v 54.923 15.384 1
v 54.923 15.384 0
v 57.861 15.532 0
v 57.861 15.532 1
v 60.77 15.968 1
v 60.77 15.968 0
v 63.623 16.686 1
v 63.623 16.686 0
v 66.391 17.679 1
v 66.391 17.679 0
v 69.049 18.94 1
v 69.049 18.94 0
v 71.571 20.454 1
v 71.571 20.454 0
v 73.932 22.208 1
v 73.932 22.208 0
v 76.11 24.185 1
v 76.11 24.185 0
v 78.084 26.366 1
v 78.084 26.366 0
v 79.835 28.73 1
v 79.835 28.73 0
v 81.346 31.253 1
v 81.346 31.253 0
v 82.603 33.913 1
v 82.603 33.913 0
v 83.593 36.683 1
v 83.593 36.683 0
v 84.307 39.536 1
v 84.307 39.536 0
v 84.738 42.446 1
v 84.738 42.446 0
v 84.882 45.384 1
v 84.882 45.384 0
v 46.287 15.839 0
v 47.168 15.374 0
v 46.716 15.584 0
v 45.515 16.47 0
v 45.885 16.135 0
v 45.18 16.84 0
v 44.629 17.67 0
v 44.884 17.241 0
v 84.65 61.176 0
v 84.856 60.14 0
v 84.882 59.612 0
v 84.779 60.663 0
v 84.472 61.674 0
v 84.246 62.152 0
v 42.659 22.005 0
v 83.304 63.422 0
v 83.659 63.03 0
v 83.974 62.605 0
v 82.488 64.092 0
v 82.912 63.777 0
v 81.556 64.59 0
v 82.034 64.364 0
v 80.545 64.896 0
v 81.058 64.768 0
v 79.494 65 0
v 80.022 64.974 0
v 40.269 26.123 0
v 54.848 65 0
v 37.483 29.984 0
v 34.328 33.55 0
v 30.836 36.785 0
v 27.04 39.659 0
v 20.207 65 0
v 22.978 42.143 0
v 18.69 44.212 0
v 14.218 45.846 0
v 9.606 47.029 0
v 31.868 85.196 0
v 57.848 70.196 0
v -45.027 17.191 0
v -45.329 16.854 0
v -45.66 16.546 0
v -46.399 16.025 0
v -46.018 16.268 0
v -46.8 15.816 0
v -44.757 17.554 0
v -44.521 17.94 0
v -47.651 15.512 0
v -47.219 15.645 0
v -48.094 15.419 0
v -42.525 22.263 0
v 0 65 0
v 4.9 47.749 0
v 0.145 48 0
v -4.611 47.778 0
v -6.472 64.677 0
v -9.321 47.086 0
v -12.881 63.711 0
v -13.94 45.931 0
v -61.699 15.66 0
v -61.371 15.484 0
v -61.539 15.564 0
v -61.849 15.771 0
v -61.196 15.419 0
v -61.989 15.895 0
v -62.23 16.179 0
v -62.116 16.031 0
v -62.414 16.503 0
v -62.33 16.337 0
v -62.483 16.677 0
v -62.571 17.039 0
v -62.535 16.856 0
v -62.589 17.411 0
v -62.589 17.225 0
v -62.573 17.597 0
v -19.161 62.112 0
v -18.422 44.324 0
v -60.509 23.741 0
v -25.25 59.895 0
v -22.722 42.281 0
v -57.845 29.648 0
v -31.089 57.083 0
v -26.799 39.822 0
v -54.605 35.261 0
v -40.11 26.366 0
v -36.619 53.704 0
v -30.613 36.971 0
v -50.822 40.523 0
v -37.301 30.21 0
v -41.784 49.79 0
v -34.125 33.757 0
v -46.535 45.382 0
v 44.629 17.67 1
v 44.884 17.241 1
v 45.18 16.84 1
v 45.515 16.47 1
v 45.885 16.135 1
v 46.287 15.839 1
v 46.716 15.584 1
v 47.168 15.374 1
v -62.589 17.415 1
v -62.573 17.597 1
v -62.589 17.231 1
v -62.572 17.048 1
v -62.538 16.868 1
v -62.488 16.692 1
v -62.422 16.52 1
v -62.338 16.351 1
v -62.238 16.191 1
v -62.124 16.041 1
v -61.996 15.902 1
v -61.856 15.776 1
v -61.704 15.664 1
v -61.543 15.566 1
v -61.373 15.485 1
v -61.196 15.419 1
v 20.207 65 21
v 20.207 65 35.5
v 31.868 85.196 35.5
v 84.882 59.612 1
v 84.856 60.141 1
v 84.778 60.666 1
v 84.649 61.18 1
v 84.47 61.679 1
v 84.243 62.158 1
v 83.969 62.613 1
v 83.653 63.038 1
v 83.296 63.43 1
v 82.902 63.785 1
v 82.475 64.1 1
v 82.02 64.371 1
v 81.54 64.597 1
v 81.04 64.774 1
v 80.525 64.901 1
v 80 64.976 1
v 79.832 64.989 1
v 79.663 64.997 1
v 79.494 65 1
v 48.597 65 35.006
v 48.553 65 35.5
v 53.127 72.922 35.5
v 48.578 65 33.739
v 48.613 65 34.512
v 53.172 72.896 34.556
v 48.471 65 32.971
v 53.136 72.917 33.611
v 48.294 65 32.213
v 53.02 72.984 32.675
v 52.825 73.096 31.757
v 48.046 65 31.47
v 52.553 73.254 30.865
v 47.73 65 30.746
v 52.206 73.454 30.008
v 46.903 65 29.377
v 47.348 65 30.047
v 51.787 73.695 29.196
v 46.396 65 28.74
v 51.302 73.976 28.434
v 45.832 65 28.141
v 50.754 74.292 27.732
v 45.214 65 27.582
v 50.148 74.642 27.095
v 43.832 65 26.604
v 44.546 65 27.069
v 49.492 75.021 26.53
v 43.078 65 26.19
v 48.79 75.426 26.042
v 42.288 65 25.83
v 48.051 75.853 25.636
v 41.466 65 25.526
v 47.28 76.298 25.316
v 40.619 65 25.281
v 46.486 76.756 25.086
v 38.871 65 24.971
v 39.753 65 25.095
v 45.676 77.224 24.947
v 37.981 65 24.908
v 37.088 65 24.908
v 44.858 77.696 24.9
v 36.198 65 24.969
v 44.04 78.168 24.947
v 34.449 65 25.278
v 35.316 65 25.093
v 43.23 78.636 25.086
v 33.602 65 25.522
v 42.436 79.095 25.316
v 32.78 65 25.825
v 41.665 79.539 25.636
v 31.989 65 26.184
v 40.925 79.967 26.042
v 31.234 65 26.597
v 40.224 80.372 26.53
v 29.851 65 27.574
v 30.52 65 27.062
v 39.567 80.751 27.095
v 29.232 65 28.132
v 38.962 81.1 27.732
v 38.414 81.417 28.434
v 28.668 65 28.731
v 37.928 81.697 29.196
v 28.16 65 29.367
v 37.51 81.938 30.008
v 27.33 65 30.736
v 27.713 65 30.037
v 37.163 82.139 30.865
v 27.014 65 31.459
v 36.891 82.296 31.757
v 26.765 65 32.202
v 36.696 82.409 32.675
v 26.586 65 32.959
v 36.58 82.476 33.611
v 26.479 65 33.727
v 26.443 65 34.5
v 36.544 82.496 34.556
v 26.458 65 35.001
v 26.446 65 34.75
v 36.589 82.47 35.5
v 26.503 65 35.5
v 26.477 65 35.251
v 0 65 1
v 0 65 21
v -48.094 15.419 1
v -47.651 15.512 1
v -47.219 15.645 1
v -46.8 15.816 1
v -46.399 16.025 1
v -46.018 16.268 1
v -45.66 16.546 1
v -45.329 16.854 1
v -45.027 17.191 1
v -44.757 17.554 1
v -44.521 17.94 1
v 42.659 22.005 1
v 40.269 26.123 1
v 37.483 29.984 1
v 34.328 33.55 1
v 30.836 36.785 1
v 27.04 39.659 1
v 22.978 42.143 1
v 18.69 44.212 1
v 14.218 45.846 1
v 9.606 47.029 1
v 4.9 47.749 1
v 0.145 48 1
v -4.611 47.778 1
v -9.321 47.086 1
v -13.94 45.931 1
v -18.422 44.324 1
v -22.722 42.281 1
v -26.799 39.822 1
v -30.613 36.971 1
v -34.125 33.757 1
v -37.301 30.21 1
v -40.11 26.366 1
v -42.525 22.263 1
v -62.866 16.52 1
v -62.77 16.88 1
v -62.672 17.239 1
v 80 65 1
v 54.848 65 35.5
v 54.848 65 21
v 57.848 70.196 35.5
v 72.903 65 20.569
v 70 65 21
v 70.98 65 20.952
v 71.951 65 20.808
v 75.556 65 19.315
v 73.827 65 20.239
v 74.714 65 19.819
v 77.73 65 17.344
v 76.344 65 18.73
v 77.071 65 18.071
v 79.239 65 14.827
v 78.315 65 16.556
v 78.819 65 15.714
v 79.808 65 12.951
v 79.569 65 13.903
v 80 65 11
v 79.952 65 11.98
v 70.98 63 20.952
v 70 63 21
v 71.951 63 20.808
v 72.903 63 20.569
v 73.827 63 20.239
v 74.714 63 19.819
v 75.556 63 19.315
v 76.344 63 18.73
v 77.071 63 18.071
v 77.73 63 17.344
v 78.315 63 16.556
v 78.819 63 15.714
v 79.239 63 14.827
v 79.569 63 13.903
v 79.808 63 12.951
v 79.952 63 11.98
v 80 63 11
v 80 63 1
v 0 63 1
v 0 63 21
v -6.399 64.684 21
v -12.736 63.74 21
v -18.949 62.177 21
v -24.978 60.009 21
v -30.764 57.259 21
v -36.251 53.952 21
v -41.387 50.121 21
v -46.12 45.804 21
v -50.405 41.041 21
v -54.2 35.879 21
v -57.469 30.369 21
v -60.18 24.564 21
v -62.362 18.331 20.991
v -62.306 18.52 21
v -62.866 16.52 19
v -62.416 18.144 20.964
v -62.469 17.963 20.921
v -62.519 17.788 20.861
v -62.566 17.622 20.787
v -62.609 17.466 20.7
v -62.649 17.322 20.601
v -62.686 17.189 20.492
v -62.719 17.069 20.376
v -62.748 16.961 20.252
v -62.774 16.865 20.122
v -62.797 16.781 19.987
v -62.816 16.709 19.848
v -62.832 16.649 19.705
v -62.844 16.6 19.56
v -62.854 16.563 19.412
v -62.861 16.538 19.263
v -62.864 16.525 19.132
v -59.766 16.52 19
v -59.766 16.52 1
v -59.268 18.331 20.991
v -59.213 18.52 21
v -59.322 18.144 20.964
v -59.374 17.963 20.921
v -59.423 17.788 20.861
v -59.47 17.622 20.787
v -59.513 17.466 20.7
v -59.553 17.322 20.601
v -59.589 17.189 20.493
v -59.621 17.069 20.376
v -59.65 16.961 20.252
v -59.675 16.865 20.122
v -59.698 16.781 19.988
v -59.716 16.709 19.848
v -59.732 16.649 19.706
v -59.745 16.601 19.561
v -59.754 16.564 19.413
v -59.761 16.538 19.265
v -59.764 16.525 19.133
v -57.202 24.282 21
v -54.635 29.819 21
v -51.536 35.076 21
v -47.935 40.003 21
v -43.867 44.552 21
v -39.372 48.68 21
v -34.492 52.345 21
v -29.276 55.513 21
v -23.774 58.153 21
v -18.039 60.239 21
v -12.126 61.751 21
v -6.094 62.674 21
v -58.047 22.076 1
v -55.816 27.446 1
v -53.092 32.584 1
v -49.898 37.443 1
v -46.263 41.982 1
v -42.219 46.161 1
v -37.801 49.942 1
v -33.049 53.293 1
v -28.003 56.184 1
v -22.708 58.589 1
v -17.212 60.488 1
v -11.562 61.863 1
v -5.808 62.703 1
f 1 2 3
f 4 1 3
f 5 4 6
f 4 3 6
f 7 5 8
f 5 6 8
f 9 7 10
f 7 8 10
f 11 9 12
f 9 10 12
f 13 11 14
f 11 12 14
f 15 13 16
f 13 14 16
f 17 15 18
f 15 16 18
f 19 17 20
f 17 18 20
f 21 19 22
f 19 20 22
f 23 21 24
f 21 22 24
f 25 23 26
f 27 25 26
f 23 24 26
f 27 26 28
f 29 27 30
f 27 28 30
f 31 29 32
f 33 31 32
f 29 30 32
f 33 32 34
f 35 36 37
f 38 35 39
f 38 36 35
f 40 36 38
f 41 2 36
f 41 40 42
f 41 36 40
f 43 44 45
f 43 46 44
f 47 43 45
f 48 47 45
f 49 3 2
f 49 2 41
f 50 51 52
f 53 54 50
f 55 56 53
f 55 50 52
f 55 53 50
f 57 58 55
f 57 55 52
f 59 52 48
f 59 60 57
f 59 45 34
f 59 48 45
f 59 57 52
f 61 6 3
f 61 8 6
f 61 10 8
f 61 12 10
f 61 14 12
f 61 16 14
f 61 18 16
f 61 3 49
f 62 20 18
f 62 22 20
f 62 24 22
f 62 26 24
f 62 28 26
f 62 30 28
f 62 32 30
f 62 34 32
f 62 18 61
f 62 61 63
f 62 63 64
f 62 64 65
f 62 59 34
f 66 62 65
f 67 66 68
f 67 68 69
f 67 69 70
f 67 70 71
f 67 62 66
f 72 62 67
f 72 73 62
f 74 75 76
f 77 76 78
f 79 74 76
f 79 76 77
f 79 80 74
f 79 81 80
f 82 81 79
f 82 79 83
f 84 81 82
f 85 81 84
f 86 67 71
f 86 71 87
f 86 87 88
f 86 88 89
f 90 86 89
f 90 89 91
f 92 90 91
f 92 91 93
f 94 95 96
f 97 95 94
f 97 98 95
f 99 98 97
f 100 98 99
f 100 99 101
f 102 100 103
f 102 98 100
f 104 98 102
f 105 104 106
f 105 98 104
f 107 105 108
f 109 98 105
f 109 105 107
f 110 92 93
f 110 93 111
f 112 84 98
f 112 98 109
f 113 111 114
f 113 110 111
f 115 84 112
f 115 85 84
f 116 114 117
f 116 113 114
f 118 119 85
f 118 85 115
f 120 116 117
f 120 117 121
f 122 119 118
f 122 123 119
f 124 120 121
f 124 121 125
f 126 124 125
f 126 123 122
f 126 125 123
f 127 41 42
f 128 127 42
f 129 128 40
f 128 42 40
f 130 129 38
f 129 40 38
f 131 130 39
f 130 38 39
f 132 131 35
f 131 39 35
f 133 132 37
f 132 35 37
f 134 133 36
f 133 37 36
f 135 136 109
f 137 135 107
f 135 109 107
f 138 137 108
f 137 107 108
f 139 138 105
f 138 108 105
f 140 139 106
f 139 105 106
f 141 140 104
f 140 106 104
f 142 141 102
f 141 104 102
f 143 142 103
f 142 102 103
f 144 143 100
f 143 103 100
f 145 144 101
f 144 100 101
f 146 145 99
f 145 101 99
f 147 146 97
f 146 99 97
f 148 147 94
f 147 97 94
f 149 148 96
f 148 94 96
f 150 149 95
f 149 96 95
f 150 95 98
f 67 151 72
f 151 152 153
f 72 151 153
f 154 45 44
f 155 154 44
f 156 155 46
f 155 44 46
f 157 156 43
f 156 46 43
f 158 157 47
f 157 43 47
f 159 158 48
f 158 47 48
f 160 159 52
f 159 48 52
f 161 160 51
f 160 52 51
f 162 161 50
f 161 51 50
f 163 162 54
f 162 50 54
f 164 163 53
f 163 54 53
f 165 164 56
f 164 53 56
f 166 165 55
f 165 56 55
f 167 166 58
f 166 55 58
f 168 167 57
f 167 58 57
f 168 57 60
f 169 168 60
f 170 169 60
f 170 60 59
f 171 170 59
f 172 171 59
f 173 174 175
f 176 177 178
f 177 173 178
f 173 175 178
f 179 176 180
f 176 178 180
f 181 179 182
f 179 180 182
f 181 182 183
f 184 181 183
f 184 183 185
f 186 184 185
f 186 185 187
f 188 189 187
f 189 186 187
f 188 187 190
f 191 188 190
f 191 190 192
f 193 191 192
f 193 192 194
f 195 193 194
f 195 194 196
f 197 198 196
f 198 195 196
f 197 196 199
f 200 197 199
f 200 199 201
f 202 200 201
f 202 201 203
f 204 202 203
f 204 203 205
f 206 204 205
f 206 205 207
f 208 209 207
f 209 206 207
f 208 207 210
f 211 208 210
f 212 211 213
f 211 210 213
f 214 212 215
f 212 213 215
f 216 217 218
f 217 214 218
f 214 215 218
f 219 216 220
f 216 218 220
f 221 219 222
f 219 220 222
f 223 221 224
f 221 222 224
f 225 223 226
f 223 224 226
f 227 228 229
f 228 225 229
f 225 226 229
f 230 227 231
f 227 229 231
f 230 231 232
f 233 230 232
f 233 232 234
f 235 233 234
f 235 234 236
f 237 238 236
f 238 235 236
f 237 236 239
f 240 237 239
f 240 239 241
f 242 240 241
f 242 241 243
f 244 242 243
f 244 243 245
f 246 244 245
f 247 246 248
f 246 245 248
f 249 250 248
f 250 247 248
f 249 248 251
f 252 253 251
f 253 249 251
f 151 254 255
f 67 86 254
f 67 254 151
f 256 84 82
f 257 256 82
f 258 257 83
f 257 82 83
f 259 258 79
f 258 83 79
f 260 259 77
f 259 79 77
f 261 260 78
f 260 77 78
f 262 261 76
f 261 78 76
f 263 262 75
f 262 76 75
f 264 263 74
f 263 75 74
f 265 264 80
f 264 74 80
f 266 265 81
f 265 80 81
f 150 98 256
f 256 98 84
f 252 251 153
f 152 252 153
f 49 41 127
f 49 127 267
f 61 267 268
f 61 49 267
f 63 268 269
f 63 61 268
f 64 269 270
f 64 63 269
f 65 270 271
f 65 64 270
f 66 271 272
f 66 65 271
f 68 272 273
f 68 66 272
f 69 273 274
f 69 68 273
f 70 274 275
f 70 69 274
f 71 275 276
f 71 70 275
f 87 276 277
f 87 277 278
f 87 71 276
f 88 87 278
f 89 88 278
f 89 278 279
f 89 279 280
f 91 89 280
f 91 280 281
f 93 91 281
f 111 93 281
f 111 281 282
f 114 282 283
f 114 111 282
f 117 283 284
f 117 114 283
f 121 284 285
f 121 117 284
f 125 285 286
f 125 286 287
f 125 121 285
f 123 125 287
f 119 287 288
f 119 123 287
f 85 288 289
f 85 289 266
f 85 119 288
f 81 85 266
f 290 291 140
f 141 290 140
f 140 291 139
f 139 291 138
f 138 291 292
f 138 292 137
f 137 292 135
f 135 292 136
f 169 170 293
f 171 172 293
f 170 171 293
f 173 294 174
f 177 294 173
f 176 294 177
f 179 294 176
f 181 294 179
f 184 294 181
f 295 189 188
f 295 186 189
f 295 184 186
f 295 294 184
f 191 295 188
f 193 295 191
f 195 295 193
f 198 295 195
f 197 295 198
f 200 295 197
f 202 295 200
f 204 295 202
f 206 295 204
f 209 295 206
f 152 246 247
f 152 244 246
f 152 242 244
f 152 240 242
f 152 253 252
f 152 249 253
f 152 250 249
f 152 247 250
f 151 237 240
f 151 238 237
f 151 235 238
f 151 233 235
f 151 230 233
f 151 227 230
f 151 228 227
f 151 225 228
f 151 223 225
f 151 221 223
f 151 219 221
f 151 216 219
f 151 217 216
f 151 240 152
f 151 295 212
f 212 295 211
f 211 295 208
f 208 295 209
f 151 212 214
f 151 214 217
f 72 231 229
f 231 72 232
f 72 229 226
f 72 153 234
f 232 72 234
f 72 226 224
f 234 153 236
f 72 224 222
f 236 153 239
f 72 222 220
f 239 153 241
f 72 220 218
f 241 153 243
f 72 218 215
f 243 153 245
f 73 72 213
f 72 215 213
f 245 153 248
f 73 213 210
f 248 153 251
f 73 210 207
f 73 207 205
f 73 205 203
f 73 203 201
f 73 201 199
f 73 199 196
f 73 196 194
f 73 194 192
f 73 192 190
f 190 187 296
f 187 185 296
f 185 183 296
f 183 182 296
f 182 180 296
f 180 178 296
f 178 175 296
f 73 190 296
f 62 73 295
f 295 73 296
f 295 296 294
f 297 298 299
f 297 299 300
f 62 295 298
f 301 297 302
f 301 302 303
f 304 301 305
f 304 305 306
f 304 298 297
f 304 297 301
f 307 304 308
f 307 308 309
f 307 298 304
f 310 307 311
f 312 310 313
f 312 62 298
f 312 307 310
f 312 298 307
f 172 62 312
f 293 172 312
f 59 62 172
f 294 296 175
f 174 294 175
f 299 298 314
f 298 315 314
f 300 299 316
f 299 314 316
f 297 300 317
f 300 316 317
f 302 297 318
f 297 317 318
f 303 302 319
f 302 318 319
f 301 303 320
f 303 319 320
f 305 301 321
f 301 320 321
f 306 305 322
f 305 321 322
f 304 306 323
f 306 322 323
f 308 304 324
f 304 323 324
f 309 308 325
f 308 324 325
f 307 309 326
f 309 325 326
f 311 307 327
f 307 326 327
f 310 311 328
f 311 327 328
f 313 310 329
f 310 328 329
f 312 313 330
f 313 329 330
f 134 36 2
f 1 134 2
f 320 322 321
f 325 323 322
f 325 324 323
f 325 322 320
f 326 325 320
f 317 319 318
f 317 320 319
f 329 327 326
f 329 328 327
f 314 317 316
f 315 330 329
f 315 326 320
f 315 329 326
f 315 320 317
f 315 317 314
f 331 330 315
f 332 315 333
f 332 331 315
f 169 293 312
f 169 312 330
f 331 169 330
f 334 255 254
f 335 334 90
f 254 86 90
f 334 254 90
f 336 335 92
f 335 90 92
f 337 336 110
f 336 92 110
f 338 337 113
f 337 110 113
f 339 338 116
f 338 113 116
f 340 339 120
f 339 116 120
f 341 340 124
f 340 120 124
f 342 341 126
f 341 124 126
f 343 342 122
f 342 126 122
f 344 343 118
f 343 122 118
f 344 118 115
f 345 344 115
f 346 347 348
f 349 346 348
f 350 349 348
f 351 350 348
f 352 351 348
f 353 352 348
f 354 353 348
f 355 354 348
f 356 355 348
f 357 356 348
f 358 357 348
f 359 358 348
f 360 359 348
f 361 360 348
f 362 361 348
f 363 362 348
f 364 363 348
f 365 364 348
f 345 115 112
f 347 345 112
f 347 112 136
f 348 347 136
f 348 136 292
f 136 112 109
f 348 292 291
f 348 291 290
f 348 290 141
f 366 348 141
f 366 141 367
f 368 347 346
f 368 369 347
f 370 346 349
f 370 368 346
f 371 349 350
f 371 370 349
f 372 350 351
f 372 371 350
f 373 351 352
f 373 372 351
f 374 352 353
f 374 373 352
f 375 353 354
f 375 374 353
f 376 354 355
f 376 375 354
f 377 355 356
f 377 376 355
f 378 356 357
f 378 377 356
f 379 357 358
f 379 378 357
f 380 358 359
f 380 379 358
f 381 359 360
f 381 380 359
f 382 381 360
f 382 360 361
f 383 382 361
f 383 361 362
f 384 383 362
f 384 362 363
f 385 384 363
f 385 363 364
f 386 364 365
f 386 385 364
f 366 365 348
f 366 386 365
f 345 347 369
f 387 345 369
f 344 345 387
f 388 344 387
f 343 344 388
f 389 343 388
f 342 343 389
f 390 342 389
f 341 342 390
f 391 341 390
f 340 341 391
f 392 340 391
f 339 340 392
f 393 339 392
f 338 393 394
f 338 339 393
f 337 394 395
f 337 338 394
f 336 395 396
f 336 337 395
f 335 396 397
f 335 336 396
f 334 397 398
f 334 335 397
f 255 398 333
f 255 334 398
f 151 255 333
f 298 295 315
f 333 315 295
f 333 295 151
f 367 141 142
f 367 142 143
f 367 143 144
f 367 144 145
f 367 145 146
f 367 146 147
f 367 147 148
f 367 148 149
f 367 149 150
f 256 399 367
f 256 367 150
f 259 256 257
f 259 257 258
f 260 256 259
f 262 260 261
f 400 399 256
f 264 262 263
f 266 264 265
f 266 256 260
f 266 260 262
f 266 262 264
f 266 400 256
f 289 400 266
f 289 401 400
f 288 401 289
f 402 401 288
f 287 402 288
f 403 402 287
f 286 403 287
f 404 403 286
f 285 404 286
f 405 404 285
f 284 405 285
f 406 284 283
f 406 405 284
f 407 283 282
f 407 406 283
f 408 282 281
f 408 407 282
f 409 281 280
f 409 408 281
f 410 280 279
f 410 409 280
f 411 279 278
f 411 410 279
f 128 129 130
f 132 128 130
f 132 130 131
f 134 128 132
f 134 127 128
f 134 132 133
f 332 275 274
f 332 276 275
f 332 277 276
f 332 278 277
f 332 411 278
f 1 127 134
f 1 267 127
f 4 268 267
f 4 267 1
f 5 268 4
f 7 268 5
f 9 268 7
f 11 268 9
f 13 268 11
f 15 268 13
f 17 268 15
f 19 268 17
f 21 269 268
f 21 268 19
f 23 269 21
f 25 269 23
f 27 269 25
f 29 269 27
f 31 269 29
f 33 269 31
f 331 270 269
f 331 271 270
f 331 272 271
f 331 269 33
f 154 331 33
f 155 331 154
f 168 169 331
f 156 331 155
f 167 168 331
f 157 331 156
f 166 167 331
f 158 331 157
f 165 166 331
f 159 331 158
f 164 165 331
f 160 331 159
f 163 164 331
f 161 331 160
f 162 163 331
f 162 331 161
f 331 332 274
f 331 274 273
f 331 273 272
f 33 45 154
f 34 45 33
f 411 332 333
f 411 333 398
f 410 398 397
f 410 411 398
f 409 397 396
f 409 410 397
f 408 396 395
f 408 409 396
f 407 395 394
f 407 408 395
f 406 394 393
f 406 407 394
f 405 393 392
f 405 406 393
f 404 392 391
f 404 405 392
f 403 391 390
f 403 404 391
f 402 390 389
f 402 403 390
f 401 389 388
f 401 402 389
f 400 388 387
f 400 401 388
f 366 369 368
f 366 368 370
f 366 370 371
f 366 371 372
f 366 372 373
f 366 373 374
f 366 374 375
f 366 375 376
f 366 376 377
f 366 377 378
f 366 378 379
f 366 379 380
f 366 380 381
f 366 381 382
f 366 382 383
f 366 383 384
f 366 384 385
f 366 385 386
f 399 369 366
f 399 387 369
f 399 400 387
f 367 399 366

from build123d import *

# Parameters (mm, degrees)
PAD_DEPTH         = 1
PAD004_DEPTH      = 20
FILLET_R          = 10
FILLET001_R       = 2
PAD005_DEPTH      = 34.5
PAD005_DEPTH_BACK = 1
SKETCH005_R       = 9.6
POCKET_DEPTH      = 107.835631986


with BuildPart() as part:
    # Sketch → Pad (new body)
    with BuildSketch(Plane.XY):
        with BuildLine():
            ThreePointArc((2.407e-07, 65), (-39.2503215588, 51.8113139915), (-62.5726380514, 17.5973))
            ThreePointArc((-62.5726380514, 17.5973), (-62.2816568518, 16.2569186959), (-61.1956, 15.4192))
            Line((-61.1956, 15.4192), (-48.0942, 15.4192))
            ThreePointArc((-48.0942, 15.4192), (-46.0175682638, 16.2684180018), (-44.5213344809, 17.9402))
            ThreePointArc((44.6290648541, 17.6705), (0.1452101265, 47.9997803539), (-44.5213344809, 17.9402))
            ThreePointArc((44.6290648541, 17.6705), (45.6957884662, 16.2979684833), (47.1679586113, 15.3736))
            Line((47.1679586113, 15.3736), (54.9232114248, 15.3841578001))
            ThreePointArc((54.9232114248, 15.3841578001), (76.1100083043, 24.1853710213), (84.8823702407, 45.38413))
            Line((84.8823702407, 59.61183), (84.8823702407, 45.38413))
            ThreePointArc((84.8823702407, 59.61183), (83.3042117859, 63.4218415452), (79.4942002407, 65))
            Line((2.407e-07, 65), (79.4942002407, 65))
        make_face()
    extrude(amount=PAD_DEPTH)

    # Sketch001 → Pad004 (new body)
    with BuildSketch(Plane.XY.offset(1)):
        with BuildLine():
            ThreePointArc((6.04881e-05, 65), (-39.6936405321, 51.4724674103), (-62.8655421025, 16.5204))
            Line((-62.8655421025, 16.5204), (-59.7655421025, 16.5204))
            ThreePointArc((6.04881e-05, 63), (-37.8013201978, 49.9422727575), (-59.7655421025, 16.5204))
            Line((80.0000604881, 63), (6.04881e-05, 63))
            Line((80.0000604881, 65), (80.0000604881, 63))
            Line((6.04881e-05, 65), (80.0000604881, 65))
        make_face()
    extrude(amount=PAD004_DEPTH)

    # Fillet
    fillet_edges = [part.edges().sort_by_distance(p)[0] for p in [
        (80.00006, 64, 21),
    ]]
    fillet(fillet_edges, radius=FILLET_R)

    # Fillet001
    fillet001_edges = [part.edges().sort_by_distance(p)[0] for p in [
        (-61.315542, 16.5204, 21),
    ]]
    fillet(fillet001_edges, radius=FILLET001_R)

    # Sketch004 → Pad005 (new body, two sides)
    with BuildSketch(Plane.XY.offset(1)) as pad005_sk:
        Polygon((31.8675134595, 85.1961524227), (57.848275573, 70.1961524227), (54.848275573, 65), (20.2072594216, 65), align=None)
    extrude(amount=PAD005_DEPTH)
    extrude(pad005_sk.sketch, amount=-PAD005_DEPTH_BACK)

    # Sketch005 → Pocket (cut, through all)
    with BuildSketch(Plane(origin=(44.8578945162, 77.6961524227, 0), x_dir=(-0.8660254038, 0.5, 0), z_dir=(0.5, 0.8660254038, 0))):
        with Locations((0, 34.5)):
            Circle(SKETCH005_R)
    extrude(amount=-POCKET_DEPTH, mode=Mode.SUBTRACT)


solid = part.part
